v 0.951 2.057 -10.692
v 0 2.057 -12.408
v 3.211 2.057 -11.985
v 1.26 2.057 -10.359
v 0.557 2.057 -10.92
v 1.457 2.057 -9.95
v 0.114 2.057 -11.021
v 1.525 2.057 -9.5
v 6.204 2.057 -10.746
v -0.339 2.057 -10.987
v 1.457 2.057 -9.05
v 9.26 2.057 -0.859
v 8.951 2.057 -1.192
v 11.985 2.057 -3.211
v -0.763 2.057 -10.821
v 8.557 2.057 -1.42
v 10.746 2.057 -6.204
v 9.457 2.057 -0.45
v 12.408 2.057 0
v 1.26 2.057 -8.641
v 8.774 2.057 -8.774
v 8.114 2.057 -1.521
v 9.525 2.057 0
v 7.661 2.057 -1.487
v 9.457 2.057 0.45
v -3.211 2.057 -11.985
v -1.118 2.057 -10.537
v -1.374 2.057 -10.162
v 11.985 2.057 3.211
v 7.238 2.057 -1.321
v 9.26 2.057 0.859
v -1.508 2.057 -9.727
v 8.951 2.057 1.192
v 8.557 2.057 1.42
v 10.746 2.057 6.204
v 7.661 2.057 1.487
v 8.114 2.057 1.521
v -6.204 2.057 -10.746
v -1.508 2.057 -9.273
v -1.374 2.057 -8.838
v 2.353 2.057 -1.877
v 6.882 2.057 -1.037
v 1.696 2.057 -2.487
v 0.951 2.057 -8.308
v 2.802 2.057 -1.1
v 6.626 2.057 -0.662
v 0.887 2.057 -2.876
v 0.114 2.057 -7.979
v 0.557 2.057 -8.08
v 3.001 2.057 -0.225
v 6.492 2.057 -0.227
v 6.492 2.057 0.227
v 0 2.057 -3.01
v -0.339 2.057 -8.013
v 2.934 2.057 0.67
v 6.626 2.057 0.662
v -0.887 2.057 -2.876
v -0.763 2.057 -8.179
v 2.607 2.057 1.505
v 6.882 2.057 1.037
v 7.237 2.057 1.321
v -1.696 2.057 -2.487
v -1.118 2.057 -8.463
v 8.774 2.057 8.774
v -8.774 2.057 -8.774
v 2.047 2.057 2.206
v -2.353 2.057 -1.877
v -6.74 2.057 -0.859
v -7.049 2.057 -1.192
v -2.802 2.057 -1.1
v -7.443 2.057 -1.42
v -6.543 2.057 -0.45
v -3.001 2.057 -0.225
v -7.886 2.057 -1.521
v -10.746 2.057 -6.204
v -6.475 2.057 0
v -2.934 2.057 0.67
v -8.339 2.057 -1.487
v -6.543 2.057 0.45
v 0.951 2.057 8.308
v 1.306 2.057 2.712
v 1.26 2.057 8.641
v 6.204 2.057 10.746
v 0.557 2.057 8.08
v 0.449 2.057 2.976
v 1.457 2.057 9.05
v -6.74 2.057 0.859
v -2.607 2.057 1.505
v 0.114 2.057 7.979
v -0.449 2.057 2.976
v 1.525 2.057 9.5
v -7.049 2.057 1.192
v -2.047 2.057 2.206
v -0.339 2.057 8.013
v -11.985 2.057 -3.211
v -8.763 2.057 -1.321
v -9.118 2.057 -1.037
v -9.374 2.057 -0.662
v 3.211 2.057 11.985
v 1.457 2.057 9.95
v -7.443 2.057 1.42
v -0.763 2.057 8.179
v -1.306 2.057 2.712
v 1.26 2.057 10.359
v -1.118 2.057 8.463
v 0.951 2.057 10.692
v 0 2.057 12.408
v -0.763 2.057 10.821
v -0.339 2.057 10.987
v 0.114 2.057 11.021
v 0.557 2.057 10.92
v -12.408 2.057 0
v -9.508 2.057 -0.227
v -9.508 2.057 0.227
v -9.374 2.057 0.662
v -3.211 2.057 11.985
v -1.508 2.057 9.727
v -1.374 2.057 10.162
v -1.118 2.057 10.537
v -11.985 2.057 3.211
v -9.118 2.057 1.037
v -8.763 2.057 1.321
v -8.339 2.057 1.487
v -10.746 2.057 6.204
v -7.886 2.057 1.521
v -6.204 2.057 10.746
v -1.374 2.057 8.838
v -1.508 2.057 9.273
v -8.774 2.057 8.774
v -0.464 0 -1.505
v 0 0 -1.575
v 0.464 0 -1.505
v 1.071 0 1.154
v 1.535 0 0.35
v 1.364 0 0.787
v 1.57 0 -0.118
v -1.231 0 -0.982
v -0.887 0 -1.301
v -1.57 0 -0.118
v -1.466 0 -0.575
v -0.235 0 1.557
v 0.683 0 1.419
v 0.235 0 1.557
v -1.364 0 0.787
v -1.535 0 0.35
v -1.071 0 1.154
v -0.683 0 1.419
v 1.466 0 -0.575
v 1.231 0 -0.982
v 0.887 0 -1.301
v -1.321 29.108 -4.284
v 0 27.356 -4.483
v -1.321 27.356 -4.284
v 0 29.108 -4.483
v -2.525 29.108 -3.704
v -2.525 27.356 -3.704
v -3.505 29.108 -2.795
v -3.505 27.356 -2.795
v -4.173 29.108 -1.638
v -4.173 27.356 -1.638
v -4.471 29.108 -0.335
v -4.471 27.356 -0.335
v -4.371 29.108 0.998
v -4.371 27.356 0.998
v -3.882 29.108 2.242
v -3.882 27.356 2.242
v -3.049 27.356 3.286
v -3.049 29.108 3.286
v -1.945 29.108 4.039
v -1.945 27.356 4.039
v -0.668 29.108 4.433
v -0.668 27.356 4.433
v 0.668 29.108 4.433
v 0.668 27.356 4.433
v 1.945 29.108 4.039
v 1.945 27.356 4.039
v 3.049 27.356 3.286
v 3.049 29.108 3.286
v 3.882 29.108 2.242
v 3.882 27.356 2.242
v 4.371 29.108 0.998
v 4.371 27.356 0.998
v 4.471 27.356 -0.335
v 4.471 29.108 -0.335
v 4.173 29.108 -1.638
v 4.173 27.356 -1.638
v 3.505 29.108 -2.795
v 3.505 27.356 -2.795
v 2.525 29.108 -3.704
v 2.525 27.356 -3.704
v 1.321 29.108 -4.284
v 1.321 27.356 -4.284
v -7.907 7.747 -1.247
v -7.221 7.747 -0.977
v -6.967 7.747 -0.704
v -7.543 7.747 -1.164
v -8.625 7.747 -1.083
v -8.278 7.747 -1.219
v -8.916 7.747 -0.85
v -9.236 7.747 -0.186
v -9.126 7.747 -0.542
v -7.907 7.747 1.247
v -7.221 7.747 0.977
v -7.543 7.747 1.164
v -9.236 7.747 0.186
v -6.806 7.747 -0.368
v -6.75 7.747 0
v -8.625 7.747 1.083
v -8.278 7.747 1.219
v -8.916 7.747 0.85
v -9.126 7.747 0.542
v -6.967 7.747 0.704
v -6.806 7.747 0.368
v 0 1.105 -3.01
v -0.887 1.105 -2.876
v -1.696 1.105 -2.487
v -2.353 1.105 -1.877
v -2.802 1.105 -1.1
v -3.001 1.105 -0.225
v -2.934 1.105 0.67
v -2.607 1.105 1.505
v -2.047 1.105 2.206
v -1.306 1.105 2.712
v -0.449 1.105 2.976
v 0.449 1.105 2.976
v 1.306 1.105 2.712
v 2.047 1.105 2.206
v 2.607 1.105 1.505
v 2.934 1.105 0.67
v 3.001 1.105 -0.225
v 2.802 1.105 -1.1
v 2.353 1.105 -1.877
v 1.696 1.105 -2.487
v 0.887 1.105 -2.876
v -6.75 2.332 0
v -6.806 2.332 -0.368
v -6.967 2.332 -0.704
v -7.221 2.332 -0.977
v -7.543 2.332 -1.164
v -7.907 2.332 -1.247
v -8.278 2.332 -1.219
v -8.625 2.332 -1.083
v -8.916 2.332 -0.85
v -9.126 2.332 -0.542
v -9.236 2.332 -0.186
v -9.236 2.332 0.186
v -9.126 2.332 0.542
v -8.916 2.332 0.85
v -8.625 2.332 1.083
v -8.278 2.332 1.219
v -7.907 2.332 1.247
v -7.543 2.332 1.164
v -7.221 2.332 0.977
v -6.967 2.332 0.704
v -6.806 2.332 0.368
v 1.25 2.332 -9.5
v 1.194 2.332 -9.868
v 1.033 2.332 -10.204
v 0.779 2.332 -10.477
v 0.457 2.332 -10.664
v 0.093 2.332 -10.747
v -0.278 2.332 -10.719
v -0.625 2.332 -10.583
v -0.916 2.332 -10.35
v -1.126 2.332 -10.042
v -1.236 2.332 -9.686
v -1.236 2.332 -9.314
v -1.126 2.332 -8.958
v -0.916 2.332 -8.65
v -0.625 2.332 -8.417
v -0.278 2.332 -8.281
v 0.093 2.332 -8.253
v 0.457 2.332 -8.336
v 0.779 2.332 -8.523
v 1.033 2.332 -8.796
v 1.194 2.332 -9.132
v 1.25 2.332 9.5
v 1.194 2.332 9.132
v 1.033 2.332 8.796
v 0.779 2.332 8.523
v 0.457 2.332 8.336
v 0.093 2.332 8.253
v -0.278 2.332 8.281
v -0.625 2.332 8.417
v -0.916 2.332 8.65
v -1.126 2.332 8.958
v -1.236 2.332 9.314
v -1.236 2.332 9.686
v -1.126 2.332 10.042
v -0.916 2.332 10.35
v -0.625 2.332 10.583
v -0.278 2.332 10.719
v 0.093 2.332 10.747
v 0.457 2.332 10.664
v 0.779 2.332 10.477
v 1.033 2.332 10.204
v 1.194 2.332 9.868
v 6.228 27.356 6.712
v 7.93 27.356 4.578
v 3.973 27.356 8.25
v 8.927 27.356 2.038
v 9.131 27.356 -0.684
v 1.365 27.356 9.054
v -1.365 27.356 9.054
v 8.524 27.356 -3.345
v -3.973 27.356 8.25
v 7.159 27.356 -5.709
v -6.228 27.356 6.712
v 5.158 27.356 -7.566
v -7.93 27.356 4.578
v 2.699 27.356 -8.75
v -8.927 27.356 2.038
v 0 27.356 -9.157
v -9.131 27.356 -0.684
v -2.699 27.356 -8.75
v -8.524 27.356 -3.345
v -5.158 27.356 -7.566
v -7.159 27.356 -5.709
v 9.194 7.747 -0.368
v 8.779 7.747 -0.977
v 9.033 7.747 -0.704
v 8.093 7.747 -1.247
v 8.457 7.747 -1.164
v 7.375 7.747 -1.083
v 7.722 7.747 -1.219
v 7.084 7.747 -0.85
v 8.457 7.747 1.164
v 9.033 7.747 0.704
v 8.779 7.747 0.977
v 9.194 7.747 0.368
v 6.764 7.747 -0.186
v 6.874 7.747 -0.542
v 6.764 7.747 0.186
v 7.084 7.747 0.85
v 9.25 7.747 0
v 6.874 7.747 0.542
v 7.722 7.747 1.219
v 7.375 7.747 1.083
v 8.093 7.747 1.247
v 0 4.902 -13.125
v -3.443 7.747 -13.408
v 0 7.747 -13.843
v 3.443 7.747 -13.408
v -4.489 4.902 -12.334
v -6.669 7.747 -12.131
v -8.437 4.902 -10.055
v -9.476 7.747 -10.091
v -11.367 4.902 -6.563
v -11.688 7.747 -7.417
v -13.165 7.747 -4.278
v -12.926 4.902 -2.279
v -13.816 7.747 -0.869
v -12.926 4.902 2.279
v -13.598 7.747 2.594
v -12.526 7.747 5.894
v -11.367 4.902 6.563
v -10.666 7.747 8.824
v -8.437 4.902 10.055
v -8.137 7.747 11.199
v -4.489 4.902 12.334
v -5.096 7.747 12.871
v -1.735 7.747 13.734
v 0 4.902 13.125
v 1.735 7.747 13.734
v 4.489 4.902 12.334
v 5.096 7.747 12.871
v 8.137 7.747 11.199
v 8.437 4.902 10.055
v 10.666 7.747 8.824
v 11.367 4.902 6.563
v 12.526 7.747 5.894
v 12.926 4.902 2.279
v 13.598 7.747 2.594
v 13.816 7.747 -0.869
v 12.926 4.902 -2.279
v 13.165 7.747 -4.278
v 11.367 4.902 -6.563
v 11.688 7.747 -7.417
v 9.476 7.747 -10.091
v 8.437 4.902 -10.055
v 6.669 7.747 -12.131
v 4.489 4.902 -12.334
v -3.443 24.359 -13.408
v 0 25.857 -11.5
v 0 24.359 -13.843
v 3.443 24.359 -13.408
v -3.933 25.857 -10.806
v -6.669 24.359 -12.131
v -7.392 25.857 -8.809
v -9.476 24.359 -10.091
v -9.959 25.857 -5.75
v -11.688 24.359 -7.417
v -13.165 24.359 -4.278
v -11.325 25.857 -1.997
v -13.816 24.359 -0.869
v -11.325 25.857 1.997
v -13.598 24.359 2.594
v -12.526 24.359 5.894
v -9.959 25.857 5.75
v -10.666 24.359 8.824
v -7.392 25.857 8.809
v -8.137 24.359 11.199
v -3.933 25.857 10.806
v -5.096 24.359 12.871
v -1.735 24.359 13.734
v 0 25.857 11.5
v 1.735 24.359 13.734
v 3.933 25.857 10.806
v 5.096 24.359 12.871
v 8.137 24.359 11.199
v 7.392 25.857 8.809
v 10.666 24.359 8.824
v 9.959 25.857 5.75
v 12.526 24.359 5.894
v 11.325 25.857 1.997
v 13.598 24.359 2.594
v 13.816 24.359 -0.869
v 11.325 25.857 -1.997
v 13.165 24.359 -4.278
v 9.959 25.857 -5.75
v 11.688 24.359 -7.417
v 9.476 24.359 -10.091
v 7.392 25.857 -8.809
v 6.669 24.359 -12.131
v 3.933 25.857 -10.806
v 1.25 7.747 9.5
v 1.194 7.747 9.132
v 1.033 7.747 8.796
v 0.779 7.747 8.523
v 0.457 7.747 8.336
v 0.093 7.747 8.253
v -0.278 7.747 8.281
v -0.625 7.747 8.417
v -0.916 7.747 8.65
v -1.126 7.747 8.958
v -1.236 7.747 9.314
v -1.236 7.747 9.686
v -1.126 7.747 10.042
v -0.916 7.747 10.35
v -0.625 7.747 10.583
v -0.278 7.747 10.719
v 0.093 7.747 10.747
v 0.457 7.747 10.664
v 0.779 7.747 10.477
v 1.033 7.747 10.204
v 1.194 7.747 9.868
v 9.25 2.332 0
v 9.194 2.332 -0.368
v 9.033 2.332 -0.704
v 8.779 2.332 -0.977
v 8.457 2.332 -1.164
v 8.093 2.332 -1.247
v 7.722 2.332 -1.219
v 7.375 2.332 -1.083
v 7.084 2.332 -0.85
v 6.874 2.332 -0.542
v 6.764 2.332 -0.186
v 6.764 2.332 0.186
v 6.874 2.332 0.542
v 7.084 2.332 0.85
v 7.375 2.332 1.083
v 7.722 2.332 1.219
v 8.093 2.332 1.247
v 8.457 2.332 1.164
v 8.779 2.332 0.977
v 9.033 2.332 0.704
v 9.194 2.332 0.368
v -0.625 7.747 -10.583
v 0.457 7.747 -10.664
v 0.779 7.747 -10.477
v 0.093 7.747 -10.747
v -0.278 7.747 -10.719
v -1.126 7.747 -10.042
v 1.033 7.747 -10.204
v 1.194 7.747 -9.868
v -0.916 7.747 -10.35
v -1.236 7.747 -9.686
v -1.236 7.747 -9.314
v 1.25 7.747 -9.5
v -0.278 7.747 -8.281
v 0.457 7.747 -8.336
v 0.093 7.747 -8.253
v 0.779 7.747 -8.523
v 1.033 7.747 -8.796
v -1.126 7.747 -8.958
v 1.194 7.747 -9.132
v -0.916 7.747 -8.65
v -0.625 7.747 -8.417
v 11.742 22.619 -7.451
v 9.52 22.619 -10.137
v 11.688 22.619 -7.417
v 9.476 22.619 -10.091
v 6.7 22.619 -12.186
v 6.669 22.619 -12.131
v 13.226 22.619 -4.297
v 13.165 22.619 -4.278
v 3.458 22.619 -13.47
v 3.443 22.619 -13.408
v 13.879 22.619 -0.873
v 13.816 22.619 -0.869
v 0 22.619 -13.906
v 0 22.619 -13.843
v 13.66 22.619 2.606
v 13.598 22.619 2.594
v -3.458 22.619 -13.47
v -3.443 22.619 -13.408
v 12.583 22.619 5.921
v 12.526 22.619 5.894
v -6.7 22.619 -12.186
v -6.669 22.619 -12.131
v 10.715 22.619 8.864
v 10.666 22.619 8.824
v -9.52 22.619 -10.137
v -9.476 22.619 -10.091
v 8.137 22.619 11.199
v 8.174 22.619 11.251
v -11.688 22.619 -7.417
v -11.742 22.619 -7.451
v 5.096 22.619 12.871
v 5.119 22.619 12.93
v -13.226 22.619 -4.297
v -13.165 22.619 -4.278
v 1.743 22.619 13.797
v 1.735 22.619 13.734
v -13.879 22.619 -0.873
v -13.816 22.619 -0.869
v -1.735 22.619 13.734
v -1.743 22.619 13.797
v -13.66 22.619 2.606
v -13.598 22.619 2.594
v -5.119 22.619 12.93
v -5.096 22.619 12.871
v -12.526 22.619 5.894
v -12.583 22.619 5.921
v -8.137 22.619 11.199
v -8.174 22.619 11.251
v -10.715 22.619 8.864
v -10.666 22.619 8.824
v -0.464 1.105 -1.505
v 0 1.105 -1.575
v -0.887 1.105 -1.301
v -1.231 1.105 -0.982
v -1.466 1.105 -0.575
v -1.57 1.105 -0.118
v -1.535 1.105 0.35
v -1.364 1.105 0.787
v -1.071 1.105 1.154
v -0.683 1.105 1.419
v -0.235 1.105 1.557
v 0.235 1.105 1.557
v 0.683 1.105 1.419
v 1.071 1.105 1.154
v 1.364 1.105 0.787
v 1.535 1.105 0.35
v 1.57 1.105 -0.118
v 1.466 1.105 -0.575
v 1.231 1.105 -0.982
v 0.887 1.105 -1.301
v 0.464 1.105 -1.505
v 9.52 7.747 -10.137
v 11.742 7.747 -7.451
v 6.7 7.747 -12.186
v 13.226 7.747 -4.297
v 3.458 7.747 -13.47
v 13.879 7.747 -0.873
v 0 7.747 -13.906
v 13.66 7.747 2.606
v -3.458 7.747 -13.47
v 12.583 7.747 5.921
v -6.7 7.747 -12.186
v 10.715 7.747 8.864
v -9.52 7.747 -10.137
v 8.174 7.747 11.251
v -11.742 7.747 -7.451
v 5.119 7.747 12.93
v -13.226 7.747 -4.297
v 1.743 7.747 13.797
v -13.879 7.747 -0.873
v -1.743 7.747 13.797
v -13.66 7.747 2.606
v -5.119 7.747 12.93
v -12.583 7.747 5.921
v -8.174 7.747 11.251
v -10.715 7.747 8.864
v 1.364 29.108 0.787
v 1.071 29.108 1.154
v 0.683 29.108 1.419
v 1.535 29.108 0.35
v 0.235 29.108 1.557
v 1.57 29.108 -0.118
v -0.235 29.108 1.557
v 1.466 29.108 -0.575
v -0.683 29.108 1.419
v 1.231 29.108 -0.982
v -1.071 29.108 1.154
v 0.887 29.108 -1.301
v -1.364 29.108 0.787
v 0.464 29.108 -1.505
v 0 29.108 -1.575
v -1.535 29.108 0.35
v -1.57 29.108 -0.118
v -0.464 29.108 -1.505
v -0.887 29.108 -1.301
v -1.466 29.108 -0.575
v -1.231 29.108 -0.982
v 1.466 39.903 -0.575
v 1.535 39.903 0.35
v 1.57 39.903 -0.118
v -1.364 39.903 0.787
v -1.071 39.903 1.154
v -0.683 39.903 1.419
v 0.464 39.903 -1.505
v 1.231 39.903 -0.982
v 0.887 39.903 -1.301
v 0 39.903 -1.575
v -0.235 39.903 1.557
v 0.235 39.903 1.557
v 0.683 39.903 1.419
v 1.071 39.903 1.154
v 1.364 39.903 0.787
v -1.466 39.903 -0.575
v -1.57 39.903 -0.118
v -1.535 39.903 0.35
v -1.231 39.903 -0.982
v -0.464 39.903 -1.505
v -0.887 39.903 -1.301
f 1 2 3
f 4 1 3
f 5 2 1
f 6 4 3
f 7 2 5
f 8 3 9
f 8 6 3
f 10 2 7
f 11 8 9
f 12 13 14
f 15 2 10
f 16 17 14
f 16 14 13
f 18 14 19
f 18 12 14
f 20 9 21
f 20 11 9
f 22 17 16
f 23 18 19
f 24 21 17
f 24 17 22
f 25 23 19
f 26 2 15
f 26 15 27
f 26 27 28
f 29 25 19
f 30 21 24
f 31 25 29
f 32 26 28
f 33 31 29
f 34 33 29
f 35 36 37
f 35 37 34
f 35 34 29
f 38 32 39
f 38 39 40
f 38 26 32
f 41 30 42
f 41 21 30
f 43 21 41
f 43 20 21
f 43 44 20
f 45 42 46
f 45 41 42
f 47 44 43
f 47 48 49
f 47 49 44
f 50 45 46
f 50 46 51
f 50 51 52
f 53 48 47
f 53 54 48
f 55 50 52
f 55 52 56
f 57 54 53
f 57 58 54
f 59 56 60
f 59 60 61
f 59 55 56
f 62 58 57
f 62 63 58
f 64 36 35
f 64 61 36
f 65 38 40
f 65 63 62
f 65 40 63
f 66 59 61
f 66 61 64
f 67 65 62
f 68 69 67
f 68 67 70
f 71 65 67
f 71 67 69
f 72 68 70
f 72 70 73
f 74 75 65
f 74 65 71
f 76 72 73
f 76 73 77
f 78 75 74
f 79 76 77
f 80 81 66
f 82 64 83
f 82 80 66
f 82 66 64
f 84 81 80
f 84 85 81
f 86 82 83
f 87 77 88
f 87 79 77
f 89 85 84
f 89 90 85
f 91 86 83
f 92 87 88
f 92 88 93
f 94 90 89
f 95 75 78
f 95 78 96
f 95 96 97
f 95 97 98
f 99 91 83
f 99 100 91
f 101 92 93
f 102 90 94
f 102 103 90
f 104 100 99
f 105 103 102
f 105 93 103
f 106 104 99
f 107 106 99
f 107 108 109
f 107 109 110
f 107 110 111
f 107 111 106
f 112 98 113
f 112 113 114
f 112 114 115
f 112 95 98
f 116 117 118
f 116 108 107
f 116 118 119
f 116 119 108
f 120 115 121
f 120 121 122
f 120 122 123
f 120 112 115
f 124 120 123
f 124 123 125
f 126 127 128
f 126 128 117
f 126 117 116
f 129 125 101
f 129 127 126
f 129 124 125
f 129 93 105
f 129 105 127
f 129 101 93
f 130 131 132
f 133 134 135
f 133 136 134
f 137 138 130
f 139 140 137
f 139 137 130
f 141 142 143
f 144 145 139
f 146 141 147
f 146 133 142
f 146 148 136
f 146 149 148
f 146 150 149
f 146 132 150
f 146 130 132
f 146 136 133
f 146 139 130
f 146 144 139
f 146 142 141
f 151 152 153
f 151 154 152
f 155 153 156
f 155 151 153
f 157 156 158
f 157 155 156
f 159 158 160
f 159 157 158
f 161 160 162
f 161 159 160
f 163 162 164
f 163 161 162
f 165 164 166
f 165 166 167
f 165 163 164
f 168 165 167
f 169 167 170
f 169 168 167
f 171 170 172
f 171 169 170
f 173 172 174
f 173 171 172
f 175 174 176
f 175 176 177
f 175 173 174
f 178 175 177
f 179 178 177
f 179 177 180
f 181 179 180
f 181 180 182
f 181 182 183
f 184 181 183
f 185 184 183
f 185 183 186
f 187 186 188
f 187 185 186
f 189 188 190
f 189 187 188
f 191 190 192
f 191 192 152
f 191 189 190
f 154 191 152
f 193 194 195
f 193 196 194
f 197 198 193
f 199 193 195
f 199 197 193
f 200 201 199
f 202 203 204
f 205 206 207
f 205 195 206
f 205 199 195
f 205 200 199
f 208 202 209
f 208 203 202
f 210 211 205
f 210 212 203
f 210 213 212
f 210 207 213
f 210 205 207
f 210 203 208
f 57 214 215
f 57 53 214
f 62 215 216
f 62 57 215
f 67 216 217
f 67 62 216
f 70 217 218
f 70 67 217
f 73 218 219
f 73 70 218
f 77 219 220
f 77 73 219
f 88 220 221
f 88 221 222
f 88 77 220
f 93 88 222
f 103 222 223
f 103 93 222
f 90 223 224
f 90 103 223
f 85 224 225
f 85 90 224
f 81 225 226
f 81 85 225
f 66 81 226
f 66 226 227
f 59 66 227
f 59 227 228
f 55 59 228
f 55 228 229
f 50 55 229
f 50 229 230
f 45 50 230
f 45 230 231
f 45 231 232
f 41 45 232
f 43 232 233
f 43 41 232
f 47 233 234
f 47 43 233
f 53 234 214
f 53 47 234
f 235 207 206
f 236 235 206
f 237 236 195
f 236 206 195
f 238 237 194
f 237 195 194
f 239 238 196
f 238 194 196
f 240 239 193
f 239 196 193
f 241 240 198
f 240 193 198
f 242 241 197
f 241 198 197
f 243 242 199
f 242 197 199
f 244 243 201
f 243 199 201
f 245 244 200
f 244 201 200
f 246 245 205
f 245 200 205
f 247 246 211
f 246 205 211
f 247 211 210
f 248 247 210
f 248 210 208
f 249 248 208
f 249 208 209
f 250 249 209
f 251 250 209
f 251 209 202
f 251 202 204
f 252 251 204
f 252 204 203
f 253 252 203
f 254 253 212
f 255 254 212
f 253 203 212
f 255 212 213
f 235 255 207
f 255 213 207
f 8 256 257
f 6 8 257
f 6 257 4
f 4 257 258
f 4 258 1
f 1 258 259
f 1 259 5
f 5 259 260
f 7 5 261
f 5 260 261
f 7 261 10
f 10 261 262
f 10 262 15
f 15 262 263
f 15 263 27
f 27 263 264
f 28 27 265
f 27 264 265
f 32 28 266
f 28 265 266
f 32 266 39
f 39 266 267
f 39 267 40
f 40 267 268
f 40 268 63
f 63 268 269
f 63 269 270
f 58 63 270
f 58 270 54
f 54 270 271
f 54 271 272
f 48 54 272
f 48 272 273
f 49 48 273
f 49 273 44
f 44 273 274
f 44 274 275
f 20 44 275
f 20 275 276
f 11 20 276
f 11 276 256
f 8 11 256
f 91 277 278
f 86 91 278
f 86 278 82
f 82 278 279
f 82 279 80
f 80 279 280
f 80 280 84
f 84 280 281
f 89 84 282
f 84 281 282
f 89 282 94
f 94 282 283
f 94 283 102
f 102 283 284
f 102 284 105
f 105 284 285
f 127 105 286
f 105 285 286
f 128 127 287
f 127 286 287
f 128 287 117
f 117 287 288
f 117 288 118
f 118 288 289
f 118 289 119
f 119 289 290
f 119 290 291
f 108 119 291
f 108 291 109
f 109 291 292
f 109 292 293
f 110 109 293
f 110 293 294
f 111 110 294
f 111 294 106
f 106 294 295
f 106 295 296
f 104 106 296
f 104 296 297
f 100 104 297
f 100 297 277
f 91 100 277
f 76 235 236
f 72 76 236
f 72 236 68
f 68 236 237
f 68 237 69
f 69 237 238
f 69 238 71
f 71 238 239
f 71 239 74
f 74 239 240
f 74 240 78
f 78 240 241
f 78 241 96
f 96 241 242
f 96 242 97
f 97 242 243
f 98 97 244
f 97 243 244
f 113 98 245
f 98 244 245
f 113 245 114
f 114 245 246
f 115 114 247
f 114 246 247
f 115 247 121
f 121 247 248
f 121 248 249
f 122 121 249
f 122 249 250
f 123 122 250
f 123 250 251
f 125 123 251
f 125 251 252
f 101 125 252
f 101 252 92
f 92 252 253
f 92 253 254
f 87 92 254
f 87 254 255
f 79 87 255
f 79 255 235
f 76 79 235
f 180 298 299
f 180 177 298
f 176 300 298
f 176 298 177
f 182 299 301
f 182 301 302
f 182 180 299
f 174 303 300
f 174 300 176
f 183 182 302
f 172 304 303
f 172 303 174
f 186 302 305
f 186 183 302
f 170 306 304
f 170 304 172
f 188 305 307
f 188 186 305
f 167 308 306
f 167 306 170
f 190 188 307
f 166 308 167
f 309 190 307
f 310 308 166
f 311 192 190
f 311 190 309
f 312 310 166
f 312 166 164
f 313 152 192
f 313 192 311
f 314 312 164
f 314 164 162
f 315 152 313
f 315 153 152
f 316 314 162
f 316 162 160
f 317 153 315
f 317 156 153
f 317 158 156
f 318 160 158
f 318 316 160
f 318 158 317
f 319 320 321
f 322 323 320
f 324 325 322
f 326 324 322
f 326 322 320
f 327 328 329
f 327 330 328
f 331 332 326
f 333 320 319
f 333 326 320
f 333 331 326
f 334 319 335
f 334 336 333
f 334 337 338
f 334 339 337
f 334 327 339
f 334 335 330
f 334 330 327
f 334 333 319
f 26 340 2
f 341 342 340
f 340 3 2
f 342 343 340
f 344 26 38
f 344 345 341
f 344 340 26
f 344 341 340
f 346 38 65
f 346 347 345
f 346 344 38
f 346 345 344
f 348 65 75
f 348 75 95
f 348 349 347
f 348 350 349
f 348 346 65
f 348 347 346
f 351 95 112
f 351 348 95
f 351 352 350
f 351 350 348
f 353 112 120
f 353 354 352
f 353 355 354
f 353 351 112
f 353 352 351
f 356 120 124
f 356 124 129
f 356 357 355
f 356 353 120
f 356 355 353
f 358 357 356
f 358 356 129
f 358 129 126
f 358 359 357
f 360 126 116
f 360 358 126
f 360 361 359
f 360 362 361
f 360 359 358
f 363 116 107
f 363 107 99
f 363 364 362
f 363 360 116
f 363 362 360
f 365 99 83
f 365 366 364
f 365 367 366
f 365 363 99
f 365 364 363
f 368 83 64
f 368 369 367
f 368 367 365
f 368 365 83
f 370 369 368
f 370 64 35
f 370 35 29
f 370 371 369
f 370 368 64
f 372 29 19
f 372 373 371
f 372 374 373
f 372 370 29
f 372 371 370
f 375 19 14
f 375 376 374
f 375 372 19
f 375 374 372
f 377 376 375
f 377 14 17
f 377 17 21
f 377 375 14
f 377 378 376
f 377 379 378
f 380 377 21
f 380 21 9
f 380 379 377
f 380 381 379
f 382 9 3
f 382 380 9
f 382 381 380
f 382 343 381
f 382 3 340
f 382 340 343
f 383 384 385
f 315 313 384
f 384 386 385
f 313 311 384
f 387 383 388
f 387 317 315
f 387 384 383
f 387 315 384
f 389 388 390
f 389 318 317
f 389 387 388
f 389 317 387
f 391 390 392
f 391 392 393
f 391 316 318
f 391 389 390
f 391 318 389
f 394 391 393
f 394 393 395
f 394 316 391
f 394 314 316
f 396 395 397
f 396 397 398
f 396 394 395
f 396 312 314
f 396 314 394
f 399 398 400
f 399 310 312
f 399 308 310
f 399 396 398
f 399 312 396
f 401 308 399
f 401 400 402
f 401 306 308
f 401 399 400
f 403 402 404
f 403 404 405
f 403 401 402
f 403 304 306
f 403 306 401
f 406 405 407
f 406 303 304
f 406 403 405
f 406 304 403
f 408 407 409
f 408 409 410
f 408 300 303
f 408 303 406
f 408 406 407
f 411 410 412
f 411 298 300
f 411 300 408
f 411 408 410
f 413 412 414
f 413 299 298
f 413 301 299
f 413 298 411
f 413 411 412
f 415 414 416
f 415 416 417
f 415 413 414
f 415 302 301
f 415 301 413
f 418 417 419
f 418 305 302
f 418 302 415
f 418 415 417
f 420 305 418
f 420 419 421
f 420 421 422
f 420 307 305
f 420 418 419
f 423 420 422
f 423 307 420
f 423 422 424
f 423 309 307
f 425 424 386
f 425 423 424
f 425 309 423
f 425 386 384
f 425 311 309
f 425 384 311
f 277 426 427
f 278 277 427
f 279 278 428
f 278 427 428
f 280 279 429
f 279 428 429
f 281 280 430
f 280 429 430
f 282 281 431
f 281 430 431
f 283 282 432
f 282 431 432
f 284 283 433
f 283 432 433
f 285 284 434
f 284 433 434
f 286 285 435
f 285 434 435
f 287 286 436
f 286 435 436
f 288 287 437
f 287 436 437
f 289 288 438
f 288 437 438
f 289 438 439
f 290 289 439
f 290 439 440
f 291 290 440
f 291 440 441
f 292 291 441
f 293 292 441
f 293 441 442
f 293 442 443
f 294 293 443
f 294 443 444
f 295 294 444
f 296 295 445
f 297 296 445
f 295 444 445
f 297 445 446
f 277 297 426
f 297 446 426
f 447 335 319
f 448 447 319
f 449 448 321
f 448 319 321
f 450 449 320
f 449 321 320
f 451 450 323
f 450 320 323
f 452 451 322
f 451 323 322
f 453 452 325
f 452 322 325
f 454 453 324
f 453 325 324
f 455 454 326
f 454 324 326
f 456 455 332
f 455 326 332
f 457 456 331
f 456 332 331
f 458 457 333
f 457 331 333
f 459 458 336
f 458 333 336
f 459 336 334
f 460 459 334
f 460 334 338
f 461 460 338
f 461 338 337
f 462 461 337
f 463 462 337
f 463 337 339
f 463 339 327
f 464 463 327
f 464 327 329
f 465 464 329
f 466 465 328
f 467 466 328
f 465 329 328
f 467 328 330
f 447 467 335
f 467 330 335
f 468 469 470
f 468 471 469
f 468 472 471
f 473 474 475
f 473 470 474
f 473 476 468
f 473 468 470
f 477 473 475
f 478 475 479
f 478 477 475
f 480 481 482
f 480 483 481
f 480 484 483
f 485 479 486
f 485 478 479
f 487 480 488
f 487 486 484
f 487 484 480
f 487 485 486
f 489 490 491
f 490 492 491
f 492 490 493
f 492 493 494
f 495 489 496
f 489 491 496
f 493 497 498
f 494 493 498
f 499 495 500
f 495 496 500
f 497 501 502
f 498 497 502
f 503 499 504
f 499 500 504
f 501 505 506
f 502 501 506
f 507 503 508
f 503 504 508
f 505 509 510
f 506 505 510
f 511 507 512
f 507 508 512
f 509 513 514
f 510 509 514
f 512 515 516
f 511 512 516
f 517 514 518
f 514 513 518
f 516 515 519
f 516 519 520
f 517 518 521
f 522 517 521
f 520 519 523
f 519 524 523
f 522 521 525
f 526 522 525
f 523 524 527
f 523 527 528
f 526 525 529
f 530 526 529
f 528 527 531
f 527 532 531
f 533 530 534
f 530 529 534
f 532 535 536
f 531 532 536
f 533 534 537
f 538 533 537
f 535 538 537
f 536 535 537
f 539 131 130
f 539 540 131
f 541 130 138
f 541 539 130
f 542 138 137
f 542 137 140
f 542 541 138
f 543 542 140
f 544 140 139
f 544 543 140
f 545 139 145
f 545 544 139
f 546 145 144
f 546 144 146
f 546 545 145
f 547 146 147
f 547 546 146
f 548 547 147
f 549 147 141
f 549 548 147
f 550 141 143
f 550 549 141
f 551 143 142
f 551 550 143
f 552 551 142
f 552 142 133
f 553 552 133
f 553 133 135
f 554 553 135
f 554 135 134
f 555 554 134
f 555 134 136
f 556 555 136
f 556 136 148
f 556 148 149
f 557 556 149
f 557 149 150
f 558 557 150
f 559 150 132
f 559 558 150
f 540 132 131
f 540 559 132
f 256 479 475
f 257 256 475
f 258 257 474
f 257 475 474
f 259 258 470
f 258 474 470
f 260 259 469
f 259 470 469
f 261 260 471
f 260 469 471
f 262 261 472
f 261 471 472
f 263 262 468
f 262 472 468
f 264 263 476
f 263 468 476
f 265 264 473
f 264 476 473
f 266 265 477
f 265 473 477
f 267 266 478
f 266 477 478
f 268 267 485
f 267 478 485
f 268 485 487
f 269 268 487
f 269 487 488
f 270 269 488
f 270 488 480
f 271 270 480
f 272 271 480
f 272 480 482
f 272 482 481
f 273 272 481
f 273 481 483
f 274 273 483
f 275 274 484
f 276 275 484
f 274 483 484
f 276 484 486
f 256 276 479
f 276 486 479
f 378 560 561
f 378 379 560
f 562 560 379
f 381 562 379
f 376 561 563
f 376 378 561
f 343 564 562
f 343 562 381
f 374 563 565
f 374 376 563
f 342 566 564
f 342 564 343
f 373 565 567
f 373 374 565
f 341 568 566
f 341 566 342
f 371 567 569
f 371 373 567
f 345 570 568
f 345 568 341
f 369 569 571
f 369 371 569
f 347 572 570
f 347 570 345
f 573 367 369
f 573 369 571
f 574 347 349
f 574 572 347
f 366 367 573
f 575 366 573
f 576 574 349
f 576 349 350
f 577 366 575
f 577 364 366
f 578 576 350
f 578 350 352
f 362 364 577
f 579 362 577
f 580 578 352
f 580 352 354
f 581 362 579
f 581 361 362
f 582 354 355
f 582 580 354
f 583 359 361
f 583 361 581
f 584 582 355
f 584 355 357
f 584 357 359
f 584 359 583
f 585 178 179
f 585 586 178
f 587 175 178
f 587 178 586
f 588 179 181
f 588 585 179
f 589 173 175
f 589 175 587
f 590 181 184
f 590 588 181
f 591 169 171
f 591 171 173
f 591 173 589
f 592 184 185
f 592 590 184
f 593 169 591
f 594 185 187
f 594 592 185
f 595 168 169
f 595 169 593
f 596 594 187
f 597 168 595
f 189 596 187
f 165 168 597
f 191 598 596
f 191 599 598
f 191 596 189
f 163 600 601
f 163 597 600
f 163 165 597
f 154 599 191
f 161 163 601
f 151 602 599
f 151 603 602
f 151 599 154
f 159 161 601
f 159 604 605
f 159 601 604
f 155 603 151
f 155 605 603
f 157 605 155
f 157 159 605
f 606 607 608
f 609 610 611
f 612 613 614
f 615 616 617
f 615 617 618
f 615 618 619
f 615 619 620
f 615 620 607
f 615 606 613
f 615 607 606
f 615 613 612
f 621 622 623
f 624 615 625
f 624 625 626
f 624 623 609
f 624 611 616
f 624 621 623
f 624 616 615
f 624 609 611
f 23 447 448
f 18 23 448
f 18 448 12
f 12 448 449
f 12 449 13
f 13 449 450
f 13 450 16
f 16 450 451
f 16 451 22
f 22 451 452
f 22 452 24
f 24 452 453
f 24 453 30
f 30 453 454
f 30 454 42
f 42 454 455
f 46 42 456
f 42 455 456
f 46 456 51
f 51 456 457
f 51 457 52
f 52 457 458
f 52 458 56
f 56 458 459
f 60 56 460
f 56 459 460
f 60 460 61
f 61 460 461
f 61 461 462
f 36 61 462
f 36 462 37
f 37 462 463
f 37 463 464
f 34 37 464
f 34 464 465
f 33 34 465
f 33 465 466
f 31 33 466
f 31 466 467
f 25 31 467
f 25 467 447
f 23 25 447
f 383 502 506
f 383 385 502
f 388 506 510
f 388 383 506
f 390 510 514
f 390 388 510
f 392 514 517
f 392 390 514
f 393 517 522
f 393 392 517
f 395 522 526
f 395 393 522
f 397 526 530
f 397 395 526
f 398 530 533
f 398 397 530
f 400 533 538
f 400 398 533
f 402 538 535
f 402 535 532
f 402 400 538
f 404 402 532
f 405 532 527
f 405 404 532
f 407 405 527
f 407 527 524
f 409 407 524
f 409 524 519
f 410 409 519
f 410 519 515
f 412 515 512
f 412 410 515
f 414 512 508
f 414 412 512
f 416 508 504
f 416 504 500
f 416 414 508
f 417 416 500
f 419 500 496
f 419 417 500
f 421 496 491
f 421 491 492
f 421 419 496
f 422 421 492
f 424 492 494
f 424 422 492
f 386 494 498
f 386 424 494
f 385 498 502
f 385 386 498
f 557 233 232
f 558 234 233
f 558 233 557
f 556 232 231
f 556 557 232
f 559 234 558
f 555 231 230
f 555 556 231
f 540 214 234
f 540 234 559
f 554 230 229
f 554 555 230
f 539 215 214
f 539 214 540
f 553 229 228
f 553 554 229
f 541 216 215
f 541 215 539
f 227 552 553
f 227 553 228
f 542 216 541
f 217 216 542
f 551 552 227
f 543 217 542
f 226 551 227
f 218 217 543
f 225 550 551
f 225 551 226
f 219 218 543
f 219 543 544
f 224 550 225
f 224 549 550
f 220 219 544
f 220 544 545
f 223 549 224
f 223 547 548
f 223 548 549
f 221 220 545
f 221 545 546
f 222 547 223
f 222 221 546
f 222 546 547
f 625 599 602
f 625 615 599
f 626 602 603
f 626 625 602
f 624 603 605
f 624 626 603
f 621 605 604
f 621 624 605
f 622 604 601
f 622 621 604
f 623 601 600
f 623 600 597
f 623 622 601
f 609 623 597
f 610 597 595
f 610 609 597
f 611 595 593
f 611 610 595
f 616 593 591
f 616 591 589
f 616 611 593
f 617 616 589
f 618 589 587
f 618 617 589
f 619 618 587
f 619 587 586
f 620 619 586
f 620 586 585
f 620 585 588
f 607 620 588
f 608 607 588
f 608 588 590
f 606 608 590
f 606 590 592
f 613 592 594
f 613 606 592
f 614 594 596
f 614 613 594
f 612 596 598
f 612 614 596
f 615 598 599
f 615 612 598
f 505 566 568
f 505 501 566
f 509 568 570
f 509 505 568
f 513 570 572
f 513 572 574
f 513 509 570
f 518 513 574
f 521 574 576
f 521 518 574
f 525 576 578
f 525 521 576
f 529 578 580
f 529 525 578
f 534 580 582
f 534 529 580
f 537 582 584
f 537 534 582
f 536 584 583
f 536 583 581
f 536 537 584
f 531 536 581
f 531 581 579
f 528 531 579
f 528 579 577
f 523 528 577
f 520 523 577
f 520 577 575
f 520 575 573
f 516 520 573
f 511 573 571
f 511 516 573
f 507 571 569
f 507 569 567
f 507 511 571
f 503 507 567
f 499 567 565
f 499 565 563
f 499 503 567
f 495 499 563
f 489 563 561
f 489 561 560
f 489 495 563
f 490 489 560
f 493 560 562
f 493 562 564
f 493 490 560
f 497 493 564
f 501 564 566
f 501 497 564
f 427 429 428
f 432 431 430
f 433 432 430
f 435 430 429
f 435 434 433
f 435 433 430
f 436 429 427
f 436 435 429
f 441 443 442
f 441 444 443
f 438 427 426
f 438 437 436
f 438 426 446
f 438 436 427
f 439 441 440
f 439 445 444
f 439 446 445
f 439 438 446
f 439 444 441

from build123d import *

# Parameters (mm, degrees)
M3X0_5_TAPPED_HOLE1_D           = 2.5
M3X0_5_TAPPED_HOLE1_DEPTH       = 7.499985
M3X0_5_TAPPED_HOLE1_CSINK_D     = 3.05
M3X0_5_TAPPED_HOLE1_CSINK_ANGLE = 90
M3X0_5_TAPPED_HOLE1_TIP         = 0.751075774
M3X0_5_TAPPED_HOLE2_D           = 2.5
M3X0_5_TAPPED_HOLE2_DEPTH       = 7.499985
M3X0_5_TAPPED_HOLE2_CSINK_D     = 3.05
M3X0_5_TAPPED_HOLE2_CSINK_ANGLE = 90
M3X0_5_TAPPED_HOLE2_TIP         = 0.751075774
SKETCH11_W                      = 13.9065
SKETCH11_H                      = 14.8717


with BuildPart() as part:
    # Sketch4 → Revolve1 (revolve)
    with BuildSketch(Plane.XY, mode=Mode.PRIVATE) as revolve1_sk:
        Polygon((0, 0), (1.5748, 0), (1.5748, 1.1049), (3.0099, 1.1049), (3.0099, 2.0574), (12.4079, 2.0574), (13.843, 7.747), (13.843, 24.3586), (9.1567, 27.3558), (4.4831, 27.3558), (4.4831, 29.1084), (1.5748, 29.1084), (1.5748, 39.9034), (0, 39.9034), align=None)
    revolve(revolve1_sk.sketch.rotate(Axis((0, -72.371810048, 0), (0, 1, 0)), 90), axis=Axis((0, -72.371810048, 0), (0, 1, 0)))

    # M3x0.5 Tapped Hole1
    with Locations(Plane(origin=(0, 2.0574, 0), x_dir=(-1, 0, 0), z_dir=(0, -1, 0))):
        with Locations((8, 0), (-8, 0)):
            CounterSinkHole(M3X0_5_TAPPED_HOLE1_D / 2, M3X0_5_TAPPED_HOLE1_CSINK_D / 2, depth=M3X0_5_TAPPED_HOLE1_DEPTH, counter_sink_angle=M3X0_5_TAPPED_HOLE1_CSINK_ANGLE)
            with Locations((0, 0, -(M3X0_5_TAPPED_HOLE1_DEPTH + M3X0_5_TAPPED_HOLE1_TIP / 2))):  # 118° drill point
                Cone(0, M3X0_5_TAPPED_HOLE1_D / 2, M3X0_5_TAPPED_HOLE1_TIP, mode=Mode.SUBTRACT)

    # M3x0.5 Tapped Hole2
    with Locations(Plane(origin=(0, 2.0574, 0), x_dir=(-1, 0, 0), z_dir=(0, -1, 0))):
        with Locations((0, 9.5), (0, -9.5)):
            CounterSinkHole(M3X0_5_TAPPED_HOLE2_D / 2, M3X0_5_TAPPED_HOLE2_CSINK_D / 2, depth=M3X0_5_TAPPED_HOLE2_DEPTH, counter_sink_angle=M3X0_5_TAPPED_HOLE2_CSINK_ANGLE)
            with Locations((0, 0, -(M3X0_5_TAPPED_HOLE2_DEPTH + M3X0_5_TAPPED_HOLE2_TIP / 2))):  # 118° drill point
                Cone(0, M3X0_5_TAPPED_HOLE2_D / 2, M3X0_5_TAPPED_HOLE2_TIP, mode=Mode.SUBTRACT)

    # Sketch11 → Revolve2 (revolve)
    with BuildSketch(Plane.XY, mode=Mode.PRIVATE) as revolve2_sk:
        with Locations((6.95325, 15.18285)):
            Rectangle(SKETCH11_W, SKETCH11_H)
    revolve(revolve2_sk.sketch.rotate(Axis((0, -72.371810048, 0), (0, 1, 0)), 90), axis=Axis((0, -72.371810048, 0), (0, 1, 0)))


solid = part.part
